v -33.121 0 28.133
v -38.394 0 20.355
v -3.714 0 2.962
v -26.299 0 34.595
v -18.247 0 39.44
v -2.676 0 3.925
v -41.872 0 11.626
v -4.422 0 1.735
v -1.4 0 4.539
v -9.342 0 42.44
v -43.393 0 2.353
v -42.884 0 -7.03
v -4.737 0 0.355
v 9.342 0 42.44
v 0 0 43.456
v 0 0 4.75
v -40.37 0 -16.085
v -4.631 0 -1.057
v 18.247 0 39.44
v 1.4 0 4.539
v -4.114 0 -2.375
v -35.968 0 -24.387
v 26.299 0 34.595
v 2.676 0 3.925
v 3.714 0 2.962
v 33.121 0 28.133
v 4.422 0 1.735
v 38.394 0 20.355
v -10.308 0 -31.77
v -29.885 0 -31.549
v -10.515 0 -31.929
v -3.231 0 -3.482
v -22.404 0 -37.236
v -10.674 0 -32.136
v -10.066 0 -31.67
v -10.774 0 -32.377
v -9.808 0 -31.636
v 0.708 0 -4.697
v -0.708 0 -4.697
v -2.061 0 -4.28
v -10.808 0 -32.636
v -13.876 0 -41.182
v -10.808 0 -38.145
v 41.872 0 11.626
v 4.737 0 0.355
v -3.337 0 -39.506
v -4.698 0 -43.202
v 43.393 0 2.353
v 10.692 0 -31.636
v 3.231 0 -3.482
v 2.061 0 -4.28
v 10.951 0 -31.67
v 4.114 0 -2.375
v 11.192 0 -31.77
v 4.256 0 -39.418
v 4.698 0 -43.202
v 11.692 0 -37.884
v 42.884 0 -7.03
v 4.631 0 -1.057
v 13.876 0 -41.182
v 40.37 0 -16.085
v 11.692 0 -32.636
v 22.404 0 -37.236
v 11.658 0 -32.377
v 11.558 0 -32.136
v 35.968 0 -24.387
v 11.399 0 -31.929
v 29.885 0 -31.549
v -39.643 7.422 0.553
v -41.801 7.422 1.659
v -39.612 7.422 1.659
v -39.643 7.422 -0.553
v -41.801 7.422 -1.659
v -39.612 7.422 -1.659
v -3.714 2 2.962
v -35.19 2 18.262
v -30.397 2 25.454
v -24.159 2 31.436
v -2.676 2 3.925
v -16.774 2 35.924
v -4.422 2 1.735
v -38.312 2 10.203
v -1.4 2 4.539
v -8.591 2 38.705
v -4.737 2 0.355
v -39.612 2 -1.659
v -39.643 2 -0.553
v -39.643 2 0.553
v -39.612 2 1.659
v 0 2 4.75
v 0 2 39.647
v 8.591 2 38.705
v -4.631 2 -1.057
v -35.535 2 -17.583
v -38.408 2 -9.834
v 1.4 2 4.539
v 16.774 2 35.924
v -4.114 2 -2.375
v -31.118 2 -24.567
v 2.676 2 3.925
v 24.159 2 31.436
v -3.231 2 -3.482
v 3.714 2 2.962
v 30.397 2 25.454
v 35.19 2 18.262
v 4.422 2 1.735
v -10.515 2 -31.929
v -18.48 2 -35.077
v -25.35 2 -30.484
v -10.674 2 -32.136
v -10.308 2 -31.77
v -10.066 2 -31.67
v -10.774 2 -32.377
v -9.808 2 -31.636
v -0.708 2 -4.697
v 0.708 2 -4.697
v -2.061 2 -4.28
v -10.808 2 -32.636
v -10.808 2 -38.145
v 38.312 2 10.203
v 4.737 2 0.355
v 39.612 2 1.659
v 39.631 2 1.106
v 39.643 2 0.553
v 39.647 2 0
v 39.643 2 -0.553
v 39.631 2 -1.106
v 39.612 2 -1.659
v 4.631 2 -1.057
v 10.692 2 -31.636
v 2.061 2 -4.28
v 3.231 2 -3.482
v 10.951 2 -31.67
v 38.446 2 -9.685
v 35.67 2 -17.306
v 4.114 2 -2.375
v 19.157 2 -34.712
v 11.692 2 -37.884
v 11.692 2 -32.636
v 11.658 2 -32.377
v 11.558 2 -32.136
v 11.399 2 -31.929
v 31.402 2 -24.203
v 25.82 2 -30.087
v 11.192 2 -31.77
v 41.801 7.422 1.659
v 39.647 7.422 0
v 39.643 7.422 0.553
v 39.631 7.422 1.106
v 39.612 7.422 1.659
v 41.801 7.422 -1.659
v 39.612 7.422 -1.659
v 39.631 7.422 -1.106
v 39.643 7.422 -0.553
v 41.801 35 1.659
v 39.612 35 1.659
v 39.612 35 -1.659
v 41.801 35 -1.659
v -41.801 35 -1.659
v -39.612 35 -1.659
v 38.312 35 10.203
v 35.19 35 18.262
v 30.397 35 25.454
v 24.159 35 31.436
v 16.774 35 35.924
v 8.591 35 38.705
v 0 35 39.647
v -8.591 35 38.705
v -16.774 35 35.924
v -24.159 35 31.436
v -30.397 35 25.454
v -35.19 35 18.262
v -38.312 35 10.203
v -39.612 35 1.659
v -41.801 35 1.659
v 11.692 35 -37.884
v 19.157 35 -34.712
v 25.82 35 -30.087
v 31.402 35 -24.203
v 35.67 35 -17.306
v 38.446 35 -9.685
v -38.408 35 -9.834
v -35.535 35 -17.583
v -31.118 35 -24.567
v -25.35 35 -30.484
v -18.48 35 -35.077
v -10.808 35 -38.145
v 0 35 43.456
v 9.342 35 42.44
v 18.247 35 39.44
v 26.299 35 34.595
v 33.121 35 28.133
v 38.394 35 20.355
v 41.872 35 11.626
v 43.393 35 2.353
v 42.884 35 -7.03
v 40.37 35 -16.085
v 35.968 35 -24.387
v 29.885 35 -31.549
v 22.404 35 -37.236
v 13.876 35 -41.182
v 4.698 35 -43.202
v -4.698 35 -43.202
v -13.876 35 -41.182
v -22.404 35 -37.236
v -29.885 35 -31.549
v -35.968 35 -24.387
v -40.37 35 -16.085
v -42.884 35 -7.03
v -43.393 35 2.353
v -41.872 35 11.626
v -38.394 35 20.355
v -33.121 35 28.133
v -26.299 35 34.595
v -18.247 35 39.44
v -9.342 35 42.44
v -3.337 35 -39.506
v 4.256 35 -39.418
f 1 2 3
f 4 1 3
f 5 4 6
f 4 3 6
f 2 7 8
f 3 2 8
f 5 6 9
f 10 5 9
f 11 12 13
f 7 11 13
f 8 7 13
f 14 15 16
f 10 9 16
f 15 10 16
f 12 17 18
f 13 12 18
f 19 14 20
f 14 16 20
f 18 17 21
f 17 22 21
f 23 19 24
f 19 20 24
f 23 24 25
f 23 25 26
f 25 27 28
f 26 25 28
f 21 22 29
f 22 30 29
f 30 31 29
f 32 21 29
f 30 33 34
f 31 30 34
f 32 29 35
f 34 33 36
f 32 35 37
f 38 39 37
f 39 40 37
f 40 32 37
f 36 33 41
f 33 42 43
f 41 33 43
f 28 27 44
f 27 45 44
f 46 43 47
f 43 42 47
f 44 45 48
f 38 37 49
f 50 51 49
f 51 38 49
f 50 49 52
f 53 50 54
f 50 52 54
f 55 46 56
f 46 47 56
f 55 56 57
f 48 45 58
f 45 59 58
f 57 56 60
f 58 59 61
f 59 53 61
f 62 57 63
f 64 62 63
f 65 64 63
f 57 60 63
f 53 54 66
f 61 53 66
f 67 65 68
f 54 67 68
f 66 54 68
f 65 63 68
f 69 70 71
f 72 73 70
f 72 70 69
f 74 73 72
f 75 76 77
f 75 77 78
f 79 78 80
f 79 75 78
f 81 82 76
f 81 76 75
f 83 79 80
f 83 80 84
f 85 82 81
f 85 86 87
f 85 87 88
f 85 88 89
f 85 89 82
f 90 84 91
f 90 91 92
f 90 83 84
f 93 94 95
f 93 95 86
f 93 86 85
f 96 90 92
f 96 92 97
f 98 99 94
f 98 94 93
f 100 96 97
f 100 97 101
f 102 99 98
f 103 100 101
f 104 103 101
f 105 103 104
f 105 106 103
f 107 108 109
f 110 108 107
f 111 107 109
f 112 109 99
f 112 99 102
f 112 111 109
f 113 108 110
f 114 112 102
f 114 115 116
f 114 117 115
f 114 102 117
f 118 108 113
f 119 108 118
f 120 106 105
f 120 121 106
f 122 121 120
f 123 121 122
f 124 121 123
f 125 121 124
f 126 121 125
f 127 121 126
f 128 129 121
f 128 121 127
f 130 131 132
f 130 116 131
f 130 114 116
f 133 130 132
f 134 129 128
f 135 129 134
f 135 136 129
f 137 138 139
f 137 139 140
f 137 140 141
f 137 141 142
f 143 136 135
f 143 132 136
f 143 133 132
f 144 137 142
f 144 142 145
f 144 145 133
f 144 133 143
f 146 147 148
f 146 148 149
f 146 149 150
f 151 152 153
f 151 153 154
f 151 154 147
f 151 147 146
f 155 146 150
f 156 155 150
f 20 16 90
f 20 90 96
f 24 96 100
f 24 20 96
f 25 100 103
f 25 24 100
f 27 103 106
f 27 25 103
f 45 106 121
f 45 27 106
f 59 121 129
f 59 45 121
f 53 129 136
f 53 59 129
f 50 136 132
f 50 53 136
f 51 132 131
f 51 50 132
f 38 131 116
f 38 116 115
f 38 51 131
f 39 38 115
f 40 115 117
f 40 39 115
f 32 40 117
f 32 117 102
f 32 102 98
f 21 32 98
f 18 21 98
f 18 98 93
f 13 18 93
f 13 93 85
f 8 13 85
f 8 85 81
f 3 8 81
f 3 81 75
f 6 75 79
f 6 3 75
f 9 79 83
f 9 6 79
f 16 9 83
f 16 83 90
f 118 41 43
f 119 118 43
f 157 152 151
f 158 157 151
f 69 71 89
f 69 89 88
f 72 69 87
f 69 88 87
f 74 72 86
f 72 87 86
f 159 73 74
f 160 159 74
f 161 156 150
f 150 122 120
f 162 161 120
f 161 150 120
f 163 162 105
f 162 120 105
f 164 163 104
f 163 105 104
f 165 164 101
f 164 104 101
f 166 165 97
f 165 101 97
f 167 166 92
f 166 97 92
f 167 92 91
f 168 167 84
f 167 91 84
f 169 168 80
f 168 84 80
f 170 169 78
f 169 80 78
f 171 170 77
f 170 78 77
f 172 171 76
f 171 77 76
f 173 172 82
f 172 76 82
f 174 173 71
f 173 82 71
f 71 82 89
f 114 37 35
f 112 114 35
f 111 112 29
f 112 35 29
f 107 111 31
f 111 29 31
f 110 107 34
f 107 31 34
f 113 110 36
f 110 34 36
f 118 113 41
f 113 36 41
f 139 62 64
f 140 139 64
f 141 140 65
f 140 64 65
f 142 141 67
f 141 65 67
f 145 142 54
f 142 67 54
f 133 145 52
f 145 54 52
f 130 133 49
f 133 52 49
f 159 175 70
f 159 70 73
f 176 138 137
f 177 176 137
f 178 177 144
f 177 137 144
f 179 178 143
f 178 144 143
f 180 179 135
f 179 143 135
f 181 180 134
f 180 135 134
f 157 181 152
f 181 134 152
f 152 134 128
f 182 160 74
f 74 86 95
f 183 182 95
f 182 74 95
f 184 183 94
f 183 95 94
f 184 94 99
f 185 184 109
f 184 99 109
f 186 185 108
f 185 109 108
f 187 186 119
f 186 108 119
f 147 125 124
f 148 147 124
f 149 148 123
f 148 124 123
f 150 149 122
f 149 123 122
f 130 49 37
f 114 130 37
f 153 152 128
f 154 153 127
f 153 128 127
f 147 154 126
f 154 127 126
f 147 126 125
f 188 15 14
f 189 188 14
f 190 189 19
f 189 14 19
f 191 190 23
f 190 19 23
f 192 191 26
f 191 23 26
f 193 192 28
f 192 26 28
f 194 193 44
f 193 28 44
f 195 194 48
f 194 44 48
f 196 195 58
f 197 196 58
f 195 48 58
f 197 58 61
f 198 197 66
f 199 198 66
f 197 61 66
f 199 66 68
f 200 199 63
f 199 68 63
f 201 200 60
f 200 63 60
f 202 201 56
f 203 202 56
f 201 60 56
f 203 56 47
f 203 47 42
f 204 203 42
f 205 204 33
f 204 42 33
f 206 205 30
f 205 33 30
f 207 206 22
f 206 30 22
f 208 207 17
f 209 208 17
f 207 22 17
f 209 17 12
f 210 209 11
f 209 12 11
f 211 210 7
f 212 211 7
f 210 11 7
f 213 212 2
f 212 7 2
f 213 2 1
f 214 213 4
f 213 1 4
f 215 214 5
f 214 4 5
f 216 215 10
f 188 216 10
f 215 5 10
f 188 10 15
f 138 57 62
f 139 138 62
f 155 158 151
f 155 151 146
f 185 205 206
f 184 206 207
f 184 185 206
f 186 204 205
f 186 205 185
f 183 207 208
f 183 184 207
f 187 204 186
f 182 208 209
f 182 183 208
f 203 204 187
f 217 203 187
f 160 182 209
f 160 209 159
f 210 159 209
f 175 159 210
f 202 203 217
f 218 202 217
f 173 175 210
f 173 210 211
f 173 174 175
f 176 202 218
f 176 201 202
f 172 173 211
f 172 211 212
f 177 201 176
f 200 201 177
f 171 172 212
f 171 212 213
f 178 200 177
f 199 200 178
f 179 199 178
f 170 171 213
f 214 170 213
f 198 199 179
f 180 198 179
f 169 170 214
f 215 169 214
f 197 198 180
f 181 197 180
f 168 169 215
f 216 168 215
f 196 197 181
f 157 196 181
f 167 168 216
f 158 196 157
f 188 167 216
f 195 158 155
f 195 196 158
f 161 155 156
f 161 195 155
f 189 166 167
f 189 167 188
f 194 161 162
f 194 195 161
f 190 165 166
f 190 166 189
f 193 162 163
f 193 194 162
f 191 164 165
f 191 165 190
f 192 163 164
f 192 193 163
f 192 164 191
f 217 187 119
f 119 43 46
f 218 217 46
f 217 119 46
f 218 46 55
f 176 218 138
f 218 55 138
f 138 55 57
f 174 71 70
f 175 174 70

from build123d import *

# Parameters (mm, degrees)
SKETCH1_R            = 43.456311094
BOSS_EXTRUDE10_DEPTH = 35
BOSS_EXTRUDE18_DEPTH = 7.421557236
SKETCH1_18_R         = 4.75
BOSS_EXTRUDE19_DEPTH = 2


with BuildPart() as part:
    # Sketch1 → Boss-Extrude10 (new body)
    with BuildSketch(Plane(origin=(0, 0, 0), x_dir=(1, 0, 0), z_dir=(0, 1, 0))):
        Circle(SKETCH1_R)
        with BuildLine():
            ThreePointArc((-10.807631289, 38.145414948), (0.461333582, 39.644227158), (11.692368711, 37.883586018))
            ThreePointArc((11.692368711, 37.883586018), (31.402087475, 24.203026213), (39.612178769, 1.659177136))
            Line((39.612178769, 1.659177136), (41.800929267, 1.659177136))
            Line((41.800929267, 1.659177136), (41.800929267, -1.659177136))
            Line((41.800929267, -1.659177136), (39.612178769, -1.659177136))
            ThreePointArc((39.612178769, -1.659177136), (0, -39.6469113), (-39.612178769, -1.659177136))
            Line((-39.612178769, -1.659177136), (-41.800929267, -1.659177136))
            Line((-41.800929267, -1.659177136), (-41.800929267, 1.659177136))
            Line((-41.800929267, 1.659177136), (-39.612178769, 1.659177136))
            ThreePointArc((-39.612178769, 1.659177136), (-31.118333808, 24.566784011), (-10.807631289, 38.145414948))
        make_face(mode=Mode.SUBTRACT)
    extrude(amount=BOSS_EXTRUDE10_DEPTH)

    # Sketch1<17> → Boss-Extrude18 (add)
    with BuildSketch(Plane(origin=(0, 0, 0), x_dir=(1, 0, 0), z_dir=(0, 1, 0))):
        with BuildLine():
            Line((41.800929267, 1.659177136), (39.612178769, 1.659177136))
            ThreePointArc((39.612178769, 1.659177136), (39.6469113, 0), (39.612178769, -1.659177136))
            Line((39.612178769, -1.659177136), (41.800929267, -1.659177136))
            Line((41.800929267, -1.659177136), (41.800929267, 1.659177136))
        make_face()
        with BuildLine():
            ThreePointArc((-39.612178769, -1.659177136), (-39.6469113, 0), (-39.612178769, 1.659177136))
            Line((-39.612178769, 1.659177136), (-41.800929267, 1.659177136))
            Line((-41.800929267, 1.659177136), (-41.800929267, -1.659177136))
            Line((-41.800929267, -1.659177136), (-39.612178769, -1.659177136))
        make_face()
    extrude(amount=BOSS_EXTRUDE18_DEPTH)

    # Sketch1<18> → Boss-Extrude19 (add)
    with BuildSketch(Plane(origin=(0, 0, 0), x_dir=(1, 0, 0), z_dir=(0, 1, 0))):
        with BuildLine():
            Line((11.692368711, 37.883586018), (11.692368711, 32.635924628))
            ThreePointArc((11.692368711, 32.635924628), (11.399475492, 31.928817847), (10.692368711, 31.635924628))
            Line((10.692368711, 31.635924628), (-9.807631289, 31.635924628))
            ThreePointArc((-9.807631289, 31.635924628), (-10.51473807, 31.928817847), (-10.807631289, 32.635924628))
            Line((-10.807631289, 32.635924628), (-10.807631289, 38.145414948))
            ThreePointArc((-10.807631289, 38.145414948), (-0.461333582, -39.644227158), (11.692368711, 37.883586018))
        make_face()
        Circle(SKETCH1_18_R, mode=Mode.SUBTRACT)
    extrude(amount=BOSS_EXTRUDE19_DEPTH)


solid = part.part
